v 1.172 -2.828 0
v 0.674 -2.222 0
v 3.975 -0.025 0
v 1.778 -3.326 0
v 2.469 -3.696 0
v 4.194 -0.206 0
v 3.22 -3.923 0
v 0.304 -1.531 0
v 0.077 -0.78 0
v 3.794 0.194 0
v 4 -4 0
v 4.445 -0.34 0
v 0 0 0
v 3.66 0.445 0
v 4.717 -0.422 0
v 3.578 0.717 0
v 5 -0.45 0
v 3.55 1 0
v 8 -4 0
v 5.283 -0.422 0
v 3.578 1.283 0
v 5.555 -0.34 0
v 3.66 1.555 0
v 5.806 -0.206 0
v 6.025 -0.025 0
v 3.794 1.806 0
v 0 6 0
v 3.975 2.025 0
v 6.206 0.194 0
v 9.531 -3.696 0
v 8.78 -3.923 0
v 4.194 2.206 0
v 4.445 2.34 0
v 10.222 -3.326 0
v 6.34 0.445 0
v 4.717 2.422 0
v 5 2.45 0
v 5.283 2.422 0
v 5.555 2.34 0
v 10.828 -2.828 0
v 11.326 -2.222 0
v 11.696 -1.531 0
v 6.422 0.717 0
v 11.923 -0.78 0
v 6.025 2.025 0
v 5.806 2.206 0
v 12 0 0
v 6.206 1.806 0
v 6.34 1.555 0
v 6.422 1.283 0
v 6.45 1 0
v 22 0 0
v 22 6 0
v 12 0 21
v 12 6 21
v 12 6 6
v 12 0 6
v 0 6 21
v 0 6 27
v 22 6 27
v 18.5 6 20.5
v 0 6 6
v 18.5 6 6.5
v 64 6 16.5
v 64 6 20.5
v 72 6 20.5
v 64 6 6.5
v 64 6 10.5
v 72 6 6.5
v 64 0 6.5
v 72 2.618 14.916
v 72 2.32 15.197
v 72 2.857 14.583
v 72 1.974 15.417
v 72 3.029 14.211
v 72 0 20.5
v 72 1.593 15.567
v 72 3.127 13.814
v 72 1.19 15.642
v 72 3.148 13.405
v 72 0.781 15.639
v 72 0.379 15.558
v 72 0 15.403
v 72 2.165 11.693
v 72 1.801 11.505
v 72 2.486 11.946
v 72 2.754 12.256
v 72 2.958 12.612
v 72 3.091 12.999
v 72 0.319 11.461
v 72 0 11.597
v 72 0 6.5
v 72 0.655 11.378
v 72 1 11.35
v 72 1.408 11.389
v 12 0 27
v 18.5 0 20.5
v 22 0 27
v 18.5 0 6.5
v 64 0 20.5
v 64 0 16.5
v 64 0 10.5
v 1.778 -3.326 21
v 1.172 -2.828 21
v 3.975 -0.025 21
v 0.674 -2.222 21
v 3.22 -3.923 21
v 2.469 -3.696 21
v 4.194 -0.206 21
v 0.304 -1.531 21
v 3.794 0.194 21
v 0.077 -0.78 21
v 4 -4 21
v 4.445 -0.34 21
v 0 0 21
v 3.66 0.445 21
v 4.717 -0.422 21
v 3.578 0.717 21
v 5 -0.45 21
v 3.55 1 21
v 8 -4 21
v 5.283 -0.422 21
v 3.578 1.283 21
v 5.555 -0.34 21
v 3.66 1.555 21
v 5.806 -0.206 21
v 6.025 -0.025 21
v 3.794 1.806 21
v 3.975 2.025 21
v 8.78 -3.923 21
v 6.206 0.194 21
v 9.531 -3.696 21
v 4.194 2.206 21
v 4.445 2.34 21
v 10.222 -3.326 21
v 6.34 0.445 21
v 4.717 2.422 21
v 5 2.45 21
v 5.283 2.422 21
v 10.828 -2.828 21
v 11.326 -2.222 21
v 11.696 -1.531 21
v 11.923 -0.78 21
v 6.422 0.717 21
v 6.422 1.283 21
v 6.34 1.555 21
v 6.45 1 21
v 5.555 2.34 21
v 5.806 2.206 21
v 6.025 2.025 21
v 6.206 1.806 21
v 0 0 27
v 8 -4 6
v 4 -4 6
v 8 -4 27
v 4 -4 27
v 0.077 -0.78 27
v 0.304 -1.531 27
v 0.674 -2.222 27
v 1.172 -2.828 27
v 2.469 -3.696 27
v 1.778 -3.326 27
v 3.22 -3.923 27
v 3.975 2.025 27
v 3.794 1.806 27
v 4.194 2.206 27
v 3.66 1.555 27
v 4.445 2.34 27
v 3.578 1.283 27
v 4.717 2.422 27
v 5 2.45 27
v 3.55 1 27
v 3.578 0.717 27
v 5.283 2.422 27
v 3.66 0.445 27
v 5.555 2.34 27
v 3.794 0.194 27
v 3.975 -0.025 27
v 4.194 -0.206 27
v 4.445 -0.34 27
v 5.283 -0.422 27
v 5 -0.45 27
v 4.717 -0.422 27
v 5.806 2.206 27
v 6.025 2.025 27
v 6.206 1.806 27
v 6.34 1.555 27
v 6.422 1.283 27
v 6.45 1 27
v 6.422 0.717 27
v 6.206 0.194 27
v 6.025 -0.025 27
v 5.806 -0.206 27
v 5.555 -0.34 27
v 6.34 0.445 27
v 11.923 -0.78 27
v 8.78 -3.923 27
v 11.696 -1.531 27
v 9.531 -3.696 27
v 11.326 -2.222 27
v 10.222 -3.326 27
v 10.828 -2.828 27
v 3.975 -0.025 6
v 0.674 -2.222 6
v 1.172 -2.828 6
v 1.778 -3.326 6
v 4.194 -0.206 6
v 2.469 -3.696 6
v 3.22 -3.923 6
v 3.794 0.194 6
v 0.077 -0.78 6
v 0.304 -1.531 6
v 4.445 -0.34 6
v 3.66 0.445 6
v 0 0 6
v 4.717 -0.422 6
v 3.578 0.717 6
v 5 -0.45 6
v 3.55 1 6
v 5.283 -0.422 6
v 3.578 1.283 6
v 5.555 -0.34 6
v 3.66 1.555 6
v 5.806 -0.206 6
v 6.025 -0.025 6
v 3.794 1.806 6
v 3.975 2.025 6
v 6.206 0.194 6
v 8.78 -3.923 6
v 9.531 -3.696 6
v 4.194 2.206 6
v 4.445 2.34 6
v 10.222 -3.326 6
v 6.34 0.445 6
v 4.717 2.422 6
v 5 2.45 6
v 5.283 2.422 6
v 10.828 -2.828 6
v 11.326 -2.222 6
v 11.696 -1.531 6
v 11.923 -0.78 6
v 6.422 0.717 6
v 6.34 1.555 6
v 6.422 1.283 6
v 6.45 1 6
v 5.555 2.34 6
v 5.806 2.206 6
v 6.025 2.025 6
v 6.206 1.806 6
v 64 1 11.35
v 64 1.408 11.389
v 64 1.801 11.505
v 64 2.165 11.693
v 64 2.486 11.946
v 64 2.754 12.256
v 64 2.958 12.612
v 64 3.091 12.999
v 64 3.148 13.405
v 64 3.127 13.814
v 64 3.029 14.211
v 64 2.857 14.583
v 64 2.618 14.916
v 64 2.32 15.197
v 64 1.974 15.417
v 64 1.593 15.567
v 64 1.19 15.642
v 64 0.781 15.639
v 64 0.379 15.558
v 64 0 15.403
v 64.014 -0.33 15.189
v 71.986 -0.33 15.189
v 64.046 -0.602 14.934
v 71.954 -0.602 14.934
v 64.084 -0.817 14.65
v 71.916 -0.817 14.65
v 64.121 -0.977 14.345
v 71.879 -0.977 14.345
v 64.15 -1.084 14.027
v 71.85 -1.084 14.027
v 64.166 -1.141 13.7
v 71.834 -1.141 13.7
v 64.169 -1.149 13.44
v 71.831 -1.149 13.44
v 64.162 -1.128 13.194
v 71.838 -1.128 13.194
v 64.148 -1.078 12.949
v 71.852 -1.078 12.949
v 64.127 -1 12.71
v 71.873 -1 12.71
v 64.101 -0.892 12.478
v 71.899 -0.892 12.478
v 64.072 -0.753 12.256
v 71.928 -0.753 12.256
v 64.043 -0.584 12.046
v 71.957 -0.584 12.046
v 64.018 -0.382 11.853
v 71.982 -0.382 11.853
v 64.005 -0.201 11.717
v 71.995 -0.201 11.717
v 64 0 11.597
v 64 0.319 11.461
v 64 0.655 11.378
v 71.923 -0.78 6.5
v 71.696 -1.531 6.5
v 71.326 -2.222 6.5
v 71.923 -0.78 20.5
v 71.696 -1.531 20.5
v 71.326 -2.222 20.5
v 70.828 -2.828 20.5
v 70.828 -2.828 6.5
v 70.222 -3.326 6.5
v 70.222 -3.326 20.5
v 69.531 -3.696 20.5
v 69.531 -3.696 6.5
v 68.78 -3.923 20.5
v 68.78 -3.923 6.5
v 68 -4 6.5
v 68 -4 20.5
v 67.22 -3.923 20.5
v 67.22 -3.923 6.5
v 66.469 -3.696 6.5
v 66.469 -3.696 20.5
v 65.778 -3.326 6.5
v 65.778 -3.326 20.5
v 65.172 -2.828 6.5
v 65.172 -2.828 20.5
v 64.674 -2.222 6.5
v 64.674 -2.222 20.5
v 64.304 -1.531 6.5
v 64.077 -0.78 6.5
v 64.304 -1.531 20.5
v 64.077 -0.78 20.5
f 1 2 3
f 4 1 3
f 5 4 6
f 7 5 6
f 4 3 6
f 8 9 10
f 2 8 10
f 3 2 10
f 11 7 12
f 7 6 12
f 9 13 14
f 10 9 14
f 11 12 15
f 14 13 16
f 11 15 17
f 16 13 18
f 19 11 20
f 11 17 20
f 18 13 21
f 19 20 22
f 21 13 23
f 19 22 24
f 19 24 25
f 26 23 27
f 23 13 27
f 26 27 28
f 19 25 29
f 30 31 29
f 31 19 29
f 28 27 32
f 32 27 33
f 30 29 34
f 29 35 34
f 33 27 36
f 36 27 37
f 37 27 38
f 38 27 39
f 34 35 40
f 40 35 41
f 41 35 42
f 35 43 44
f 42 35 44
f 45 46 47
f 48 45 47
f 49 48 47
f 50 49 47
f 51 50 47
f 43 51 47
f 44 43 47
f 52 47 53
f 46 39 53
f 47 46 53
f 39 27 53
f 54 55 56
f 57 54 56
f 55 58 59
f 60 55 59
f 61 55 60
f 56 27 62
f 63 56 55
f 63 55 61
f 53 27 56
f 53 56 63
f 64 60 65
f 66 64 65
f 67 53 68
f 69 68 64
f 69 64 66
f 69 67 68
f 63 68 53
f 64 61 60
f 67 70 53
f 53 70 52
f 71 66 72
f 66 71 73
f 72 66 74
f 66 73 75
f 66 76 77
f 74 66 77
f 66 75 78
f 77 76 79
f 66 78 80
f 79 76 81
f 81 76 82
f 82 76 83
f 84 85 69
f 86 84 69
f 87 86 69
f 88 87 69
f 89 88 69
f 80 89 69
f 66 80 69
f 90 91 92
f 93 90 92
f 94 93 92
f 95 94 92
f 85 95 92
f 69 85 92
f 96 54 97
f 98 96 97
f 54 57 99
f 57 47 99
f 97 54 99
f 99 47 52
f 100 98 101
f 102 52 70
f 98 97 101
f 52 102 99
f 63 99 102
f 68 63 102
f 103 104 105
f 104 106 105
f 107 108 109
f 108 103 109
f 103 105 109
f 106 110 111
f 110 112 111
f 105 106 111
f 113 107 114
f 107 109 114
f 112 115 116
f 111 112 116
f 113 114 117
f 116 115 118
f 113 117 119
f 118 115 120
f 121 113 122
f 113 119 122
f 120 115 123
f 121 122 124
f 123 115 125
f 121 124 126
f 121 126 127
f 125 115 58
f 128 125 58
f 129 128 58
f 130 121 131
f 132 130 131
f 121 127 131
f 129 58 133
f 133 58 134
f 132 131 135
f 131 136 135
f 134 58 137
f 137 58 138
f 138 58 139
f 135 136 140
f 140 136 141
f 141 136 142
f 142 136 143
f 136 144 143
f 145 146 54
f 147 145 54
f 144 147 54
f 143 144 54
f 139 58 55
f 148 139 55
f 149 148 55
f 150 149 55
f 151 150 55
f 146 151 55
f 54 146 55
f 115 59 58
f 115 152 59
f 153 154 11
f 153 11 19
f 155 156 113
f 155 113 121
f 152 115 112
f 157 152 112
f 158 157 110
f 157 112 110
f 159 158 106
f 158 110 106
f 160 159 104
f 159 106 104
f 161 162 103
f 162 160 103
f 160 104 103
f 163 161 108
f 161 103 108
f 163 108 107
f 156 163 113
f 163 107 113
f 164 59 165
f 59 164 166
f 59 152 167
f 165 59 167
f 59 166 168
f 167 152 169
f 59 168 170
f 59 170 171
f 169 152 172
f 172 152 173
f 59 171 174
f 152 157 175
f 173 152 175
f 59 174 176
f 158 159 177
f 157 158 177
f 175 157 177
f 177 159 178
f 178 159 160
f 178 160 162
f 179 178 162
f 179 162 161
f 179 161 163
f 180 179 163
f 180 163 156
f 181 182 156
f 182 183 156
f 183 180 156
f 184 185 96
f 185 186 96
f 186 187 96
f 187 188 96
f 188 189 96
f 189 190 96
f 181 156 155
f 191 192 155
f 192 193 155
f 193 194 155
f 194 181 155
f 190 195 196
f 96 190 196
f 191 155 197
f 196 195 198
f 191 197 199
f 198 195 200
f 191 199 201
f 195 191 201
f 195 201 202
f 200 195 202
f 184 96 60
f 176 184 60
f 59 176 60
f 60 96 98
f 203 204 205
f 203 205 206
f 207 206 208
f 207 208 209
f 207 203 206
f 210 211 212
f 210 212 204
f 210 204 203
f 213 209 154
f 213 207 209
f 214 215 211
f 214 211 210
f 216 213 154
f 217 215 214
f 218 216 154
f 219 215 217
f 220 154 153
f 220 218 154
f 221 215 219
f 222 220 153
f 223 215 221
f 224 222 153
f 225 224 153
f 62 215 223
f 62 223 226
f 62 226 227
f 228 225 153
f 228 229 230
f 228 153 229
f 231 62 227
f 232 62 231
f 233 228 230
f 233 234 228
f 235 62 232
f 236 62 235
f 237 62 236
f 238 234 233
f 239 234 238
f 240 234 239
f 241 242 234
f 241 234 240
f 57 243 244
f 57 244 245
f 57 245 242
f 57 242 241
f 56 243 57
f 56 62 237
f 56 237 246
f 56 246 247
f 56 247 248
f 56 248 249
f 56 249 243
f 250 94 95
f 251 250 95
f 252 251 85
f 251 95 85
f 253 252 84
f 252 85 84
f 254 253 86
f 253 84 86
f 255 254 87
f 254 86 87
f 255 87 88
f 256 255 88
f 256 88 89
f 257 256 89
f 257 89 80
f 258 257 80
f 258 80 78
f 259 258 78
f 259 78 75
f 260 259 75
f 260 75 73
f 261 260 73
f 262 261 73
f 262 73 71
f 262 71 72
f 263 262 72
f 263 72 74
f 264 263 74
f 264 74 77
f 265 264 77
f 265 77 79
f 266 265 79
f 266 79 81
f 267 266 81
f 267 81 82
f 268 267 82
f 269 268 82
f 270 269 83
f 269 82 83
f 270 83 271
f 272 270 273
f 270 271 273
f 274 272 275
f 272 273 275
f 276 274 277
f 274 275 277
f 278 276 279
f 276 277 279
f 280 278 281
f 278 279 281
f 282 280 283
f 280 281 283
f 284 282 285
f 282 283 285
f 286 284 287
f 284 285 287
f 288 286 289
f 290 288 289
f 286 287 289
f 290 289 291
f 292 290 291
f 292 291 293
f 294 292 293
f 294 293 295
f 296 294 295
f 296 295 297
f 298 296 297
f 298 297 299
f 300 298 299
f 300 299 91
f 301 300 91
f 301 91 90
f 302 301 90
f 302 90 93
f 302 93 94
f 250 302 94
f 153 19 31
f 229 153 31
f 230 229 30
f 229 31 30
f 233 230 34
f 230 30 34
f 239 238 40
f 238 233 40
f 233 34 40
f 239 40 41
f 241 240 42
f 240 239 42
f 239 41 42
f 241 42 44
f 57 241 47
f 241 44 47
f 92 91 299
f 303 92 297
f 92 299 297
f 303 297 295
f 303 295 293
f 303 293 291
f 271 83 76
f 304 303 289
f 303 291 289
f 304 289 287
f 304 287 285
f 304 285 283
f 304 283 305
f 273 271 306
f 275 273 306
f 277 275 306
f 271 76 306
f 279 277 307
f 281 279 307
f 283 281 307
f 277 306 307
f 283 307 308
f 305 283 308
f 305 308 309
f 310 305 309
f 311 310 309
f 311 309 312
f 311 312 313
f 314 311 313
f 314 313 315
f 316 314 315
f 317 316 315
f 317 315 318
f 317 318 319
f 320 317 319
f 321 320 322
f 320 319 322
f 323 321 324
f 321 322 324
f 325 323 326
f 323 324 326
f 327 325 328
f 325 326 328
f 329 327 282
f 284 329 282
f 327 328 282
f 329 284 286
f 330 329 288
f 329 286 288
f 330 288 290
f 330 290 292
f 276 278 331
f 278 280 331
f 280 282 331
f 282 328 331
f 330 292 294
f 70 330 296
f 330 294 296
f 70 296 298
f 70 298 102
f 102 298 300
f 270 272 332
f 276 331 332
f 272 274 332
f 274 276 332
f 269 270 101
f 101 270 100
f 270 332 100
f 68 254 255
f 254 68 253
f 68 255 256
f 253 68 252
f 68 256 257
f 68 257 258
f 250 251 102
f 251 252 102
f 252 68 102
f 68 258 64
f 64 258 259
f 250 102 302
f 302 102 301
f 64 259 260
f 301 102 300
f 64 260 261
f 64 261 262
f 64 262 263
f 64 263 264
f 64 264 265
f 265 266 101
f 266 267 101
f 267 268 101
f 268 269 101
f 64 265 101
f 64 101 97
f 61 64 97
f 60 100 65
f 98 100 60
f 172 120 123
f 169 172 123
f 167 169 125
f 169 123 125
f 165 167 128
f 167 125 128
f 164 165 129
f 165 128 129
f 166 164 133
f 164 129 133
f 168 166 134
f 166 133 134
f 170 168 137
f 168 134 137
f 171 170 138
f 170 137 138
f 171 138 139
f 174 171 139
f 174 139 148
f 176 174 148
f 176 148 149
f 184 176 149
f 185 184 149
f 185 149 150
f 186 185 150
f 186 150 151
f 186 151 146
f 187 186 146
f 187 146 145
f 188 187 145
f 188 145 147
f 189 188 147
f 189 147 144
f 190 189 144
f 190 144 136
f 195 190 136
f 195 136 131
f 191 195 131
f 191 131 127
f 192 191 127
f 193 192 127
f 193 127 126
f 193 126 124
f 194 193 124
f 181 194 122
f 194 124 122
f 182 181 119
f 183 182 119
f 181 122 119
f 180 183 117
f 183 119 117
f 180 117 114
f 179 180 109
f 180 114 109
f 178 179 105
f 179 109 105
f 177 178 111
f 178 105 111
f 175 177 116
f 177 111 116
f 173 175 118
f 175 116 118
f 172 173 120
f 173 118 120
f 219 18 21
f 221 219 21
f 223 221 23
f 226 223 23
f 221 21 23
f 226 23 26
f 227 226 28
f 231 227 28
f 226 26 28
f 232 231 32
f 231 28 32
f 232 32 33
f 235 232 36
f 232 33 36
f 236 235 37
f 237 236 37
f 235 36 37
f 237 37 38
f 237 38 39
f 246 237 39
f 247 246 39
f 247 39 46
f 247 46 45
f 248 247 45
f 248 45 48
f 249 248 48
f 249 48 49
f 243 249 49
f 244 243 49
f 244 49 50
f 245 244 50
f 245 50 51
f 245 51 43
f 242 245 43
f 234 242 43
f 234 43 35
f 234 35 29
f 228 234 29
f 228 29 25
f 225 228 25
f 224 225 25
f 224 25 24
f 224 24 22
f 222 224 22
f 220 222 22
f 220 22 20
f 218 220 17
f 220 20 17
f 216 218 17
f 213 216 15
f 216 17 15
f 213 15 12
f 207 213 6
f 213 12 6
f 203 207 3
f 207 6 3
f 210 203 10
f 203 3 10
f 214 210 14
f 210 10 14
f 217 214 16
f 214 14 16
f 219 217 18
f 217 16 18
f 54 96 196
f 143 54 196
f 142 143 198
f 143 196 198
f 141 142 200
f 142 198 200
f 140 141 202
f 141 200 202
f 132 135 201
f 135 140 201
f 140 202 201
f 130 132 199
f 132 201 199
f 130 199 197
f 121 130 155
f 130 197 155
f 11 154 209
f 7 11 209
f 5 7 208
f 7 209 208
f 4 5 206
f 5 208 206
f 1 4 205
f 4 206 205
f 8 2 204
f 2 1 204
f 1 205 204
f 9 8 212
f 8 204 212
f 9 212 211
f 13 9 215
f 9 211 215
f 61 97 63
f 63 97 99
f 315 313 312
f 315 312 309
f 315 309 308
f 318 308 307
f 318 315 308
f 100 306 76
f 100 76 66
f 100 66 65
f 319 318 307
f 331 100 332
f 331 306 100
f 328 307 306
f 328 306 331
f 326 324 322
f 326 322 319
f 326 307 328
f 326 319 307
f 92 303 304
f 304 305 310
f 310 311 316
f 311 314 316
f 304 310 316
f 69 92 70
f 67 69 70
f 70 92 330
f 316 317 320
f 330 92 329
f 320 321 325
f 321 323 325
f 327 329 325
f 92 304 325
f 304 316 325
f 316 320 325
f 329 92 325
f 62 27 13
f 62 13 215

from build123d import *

# Parameters (mm, degrees)
SKETCH1_W           = 72
SKETCH1_H           = 27
BOSS_EXTRUDE1_DEPTH = 6
SKETCH2_W           = 12
SKETCH2_H           = 15
CUT_EXTRUDE1_DEPTH  = 78.129760793
SKETCH3_W           = 8
SKETCH3_H           = 14
BOSS_EXTRUDE2_DEPTH = 4
CUT_EXTRUDE2_DEPTH  = 78.129760793
SKETCH5_W           = 12
SKETCH5_H           = 6
BOSS_EXTRUDE3_DEPTH = 4
CUT_EXTRUDE4_DEPTH  = 78.129760793
SKETCH8_R           = 2.15
CUT_EXTRUDE5_DEPTH  = 10
SKETCH9_R           = 1.45
CUT_EXTRUDE6_DEPTH  = 78.129760793
FILLET2_R           = 4


with BuildPart() as part:
    # Sketch1 → Boss-Extrude1 (new body)
    with BuildSketch(Plane(origin=(0, 0, 0), x_dir=(1, 0, 0), z_dir=(0, 1, 0))):
        with Locations((36, -13.5)):
            Rectangle(SKETCH1_W, SKETCH1_H)
    extrude(amount=BOSS_EXTRUDE1_DEPTH)

    # Sketch2 → Cut-Extrude1 (cut, through all)
    with BuildSketch(Plane(origin=(0, 6, 0), x_dir=(1, 0, 0), z_dir=(0, 1, 0))):
        with Locations((6, -13.5)):
            Rectangle(SKETCH2_W, SKETCH2_H)
    extrude(amount=-CUT_EXTRUDE1_DEPTH, mode=Mode.SUBTRACT)

    # Sketch3 → Boss-Extrude2 (add)
    with BuildSketch(Plane(origin=(0, 0, 0), x_dir=(-1, 0, 0), z_dir=(0, -1, 0))):
        with Locations((-68, -13.5)):
            Rectangle(SKETCH3_W, SKETCH3_H)
    extrude(amount=BOSS_EXTRUDE2_DEPTH)

    # Sketch4 → Cut-Extrude2 (cut, through all)
    with BuildSketch(Plane(origin=(0, 0, 0), x_dir=(-1, 0, 0), z_dir=(0, -1, 0))):
        Polygon((-64, -20.5), (-22, -27), (-72, -27), (-72, -20.5), align=None)
        Polygon((-64, -6.5), (-22, 0), (-72, 0), (-72, -6.5), align=None)
    extrude(amount=-CUT_EXTRUDE2_DEPTH, mode=Mode.SUBTRACT)

    # Sketch5 → Boss-Extrude3 (add)
    with BuildSketch(Plane.XZ):
        with Locations((6, 3)):
            Rectangle(SKETCH5_W, SKETCH5_H)
        with Locations((6, 24)):
            Rectangle(SKETCH5_W, SKETCH5_H)
    extrude(amount=BOSS_EXTRUDE3_DEPTH)

    # Sketch7 → Cut-Extrude4 (cut, through all)
    with BuildSketch(Plane(origin=(0, 0, 0), x_dir=(-1, 0, 0), z_dir=(0, -1, 0))):
        Polygon((-18.5, -20.5), (-18.5, -6.5), (-64, -10.5), (-64, -16.5), align=None)
    extrude(amount=-CUT_EXTRUDE4_DEPTH, mode=Mode.SUBTRACT)

    # Sketch8 → Cut-Extrude5 (cut)
    with BuildSketch(Plane(origin=(72, 0, 0), x_dir=(0, 0, -1), z_dir=(1, 0, 0))):
        with Locations((-13.5, 1)):
            Circle(SKETCH8_R)
    extrude(amount=-CUT_EXTRUDE5_DEPTH, mode=Mode.SUBTRACT)

    # Sketch9 → Cut-Extrude6 (cut, through all)
    with BuildSketch(Plane(origin=(0, 0, 0), x_dir=(-1, 0, 0), z_dir=(0, 0, -1))):
        with Locations((-5, 1)):
            Circle(SKETCH9_R)
    extrude(amount=-CUT_EXTRUDE6_DEPTH, mode=Mode.SUBTRACT)

    # Fillet2
    # the kernel refuses this fillet: 4 mm, written as the material it takes off along each edge
    with BuildSketch(Plane(origin=(0, -4, 11), x_dir=(0, 1, 0), z_dir=(0, 0, 1)), Plane(origin=(0, -4, 16), x_dir=(1, 0, 0), z_dir=(0, 0, -1)), Plane(origin=(12, -4, 37), x_dir=(0, 1, 0), z_dir=(0, 0, -1))) as fillet2_piece_1:
        with BuildLine():
            CenterArc((FILLET2_R, -FILLET2_R), FILLET2_R, 90, 90)
            Line((0, -FILLET2_R), (0, 0))
            Line((0, 0), (FILLET2_R, 0))
        make_face()
    extrude(amount=26, mode=Mode.SUBTRACT)
    with BuildSketch(Plane(origin=(12, -4, -10), x_dir=(0, 1, 0), z_dir=(0, 0, 1))) as fillet2_piece_2:
        with BuildLine():
            CenterArc((FILLET2_R, FILLET2_R), FILLET2_R, 180, 90)
            Line((0, FILLET2_R), (0, 0))
            Line((0, 0), (FILLET2_R, 0))
        make_face()
    extrude(amount=26, mode=Mode.SUBTRACT)
    with BuildSketch(Plane(origin=(72, -4, -3.5), x_dir=(0, 1, 0), z_dir=(0, 0, 1)), Plane(origin=(64, -4, 30.5), x_dir=(0, 1, 0), z_dir=(0, 0, -1))) as fillet2_piece_3:
        with BuildLine():
            CenterArc((FILLET2_R, FILLET2_R), FILLET2_R, 180, 90)
            Line((0, FILLET2_R), (0, 0))
            Line((0, 0), (FILLET2_R, 0))
        make_face()
    extrude(amount=34, mode=Mode.SUBTRACT)


solid = part.part
